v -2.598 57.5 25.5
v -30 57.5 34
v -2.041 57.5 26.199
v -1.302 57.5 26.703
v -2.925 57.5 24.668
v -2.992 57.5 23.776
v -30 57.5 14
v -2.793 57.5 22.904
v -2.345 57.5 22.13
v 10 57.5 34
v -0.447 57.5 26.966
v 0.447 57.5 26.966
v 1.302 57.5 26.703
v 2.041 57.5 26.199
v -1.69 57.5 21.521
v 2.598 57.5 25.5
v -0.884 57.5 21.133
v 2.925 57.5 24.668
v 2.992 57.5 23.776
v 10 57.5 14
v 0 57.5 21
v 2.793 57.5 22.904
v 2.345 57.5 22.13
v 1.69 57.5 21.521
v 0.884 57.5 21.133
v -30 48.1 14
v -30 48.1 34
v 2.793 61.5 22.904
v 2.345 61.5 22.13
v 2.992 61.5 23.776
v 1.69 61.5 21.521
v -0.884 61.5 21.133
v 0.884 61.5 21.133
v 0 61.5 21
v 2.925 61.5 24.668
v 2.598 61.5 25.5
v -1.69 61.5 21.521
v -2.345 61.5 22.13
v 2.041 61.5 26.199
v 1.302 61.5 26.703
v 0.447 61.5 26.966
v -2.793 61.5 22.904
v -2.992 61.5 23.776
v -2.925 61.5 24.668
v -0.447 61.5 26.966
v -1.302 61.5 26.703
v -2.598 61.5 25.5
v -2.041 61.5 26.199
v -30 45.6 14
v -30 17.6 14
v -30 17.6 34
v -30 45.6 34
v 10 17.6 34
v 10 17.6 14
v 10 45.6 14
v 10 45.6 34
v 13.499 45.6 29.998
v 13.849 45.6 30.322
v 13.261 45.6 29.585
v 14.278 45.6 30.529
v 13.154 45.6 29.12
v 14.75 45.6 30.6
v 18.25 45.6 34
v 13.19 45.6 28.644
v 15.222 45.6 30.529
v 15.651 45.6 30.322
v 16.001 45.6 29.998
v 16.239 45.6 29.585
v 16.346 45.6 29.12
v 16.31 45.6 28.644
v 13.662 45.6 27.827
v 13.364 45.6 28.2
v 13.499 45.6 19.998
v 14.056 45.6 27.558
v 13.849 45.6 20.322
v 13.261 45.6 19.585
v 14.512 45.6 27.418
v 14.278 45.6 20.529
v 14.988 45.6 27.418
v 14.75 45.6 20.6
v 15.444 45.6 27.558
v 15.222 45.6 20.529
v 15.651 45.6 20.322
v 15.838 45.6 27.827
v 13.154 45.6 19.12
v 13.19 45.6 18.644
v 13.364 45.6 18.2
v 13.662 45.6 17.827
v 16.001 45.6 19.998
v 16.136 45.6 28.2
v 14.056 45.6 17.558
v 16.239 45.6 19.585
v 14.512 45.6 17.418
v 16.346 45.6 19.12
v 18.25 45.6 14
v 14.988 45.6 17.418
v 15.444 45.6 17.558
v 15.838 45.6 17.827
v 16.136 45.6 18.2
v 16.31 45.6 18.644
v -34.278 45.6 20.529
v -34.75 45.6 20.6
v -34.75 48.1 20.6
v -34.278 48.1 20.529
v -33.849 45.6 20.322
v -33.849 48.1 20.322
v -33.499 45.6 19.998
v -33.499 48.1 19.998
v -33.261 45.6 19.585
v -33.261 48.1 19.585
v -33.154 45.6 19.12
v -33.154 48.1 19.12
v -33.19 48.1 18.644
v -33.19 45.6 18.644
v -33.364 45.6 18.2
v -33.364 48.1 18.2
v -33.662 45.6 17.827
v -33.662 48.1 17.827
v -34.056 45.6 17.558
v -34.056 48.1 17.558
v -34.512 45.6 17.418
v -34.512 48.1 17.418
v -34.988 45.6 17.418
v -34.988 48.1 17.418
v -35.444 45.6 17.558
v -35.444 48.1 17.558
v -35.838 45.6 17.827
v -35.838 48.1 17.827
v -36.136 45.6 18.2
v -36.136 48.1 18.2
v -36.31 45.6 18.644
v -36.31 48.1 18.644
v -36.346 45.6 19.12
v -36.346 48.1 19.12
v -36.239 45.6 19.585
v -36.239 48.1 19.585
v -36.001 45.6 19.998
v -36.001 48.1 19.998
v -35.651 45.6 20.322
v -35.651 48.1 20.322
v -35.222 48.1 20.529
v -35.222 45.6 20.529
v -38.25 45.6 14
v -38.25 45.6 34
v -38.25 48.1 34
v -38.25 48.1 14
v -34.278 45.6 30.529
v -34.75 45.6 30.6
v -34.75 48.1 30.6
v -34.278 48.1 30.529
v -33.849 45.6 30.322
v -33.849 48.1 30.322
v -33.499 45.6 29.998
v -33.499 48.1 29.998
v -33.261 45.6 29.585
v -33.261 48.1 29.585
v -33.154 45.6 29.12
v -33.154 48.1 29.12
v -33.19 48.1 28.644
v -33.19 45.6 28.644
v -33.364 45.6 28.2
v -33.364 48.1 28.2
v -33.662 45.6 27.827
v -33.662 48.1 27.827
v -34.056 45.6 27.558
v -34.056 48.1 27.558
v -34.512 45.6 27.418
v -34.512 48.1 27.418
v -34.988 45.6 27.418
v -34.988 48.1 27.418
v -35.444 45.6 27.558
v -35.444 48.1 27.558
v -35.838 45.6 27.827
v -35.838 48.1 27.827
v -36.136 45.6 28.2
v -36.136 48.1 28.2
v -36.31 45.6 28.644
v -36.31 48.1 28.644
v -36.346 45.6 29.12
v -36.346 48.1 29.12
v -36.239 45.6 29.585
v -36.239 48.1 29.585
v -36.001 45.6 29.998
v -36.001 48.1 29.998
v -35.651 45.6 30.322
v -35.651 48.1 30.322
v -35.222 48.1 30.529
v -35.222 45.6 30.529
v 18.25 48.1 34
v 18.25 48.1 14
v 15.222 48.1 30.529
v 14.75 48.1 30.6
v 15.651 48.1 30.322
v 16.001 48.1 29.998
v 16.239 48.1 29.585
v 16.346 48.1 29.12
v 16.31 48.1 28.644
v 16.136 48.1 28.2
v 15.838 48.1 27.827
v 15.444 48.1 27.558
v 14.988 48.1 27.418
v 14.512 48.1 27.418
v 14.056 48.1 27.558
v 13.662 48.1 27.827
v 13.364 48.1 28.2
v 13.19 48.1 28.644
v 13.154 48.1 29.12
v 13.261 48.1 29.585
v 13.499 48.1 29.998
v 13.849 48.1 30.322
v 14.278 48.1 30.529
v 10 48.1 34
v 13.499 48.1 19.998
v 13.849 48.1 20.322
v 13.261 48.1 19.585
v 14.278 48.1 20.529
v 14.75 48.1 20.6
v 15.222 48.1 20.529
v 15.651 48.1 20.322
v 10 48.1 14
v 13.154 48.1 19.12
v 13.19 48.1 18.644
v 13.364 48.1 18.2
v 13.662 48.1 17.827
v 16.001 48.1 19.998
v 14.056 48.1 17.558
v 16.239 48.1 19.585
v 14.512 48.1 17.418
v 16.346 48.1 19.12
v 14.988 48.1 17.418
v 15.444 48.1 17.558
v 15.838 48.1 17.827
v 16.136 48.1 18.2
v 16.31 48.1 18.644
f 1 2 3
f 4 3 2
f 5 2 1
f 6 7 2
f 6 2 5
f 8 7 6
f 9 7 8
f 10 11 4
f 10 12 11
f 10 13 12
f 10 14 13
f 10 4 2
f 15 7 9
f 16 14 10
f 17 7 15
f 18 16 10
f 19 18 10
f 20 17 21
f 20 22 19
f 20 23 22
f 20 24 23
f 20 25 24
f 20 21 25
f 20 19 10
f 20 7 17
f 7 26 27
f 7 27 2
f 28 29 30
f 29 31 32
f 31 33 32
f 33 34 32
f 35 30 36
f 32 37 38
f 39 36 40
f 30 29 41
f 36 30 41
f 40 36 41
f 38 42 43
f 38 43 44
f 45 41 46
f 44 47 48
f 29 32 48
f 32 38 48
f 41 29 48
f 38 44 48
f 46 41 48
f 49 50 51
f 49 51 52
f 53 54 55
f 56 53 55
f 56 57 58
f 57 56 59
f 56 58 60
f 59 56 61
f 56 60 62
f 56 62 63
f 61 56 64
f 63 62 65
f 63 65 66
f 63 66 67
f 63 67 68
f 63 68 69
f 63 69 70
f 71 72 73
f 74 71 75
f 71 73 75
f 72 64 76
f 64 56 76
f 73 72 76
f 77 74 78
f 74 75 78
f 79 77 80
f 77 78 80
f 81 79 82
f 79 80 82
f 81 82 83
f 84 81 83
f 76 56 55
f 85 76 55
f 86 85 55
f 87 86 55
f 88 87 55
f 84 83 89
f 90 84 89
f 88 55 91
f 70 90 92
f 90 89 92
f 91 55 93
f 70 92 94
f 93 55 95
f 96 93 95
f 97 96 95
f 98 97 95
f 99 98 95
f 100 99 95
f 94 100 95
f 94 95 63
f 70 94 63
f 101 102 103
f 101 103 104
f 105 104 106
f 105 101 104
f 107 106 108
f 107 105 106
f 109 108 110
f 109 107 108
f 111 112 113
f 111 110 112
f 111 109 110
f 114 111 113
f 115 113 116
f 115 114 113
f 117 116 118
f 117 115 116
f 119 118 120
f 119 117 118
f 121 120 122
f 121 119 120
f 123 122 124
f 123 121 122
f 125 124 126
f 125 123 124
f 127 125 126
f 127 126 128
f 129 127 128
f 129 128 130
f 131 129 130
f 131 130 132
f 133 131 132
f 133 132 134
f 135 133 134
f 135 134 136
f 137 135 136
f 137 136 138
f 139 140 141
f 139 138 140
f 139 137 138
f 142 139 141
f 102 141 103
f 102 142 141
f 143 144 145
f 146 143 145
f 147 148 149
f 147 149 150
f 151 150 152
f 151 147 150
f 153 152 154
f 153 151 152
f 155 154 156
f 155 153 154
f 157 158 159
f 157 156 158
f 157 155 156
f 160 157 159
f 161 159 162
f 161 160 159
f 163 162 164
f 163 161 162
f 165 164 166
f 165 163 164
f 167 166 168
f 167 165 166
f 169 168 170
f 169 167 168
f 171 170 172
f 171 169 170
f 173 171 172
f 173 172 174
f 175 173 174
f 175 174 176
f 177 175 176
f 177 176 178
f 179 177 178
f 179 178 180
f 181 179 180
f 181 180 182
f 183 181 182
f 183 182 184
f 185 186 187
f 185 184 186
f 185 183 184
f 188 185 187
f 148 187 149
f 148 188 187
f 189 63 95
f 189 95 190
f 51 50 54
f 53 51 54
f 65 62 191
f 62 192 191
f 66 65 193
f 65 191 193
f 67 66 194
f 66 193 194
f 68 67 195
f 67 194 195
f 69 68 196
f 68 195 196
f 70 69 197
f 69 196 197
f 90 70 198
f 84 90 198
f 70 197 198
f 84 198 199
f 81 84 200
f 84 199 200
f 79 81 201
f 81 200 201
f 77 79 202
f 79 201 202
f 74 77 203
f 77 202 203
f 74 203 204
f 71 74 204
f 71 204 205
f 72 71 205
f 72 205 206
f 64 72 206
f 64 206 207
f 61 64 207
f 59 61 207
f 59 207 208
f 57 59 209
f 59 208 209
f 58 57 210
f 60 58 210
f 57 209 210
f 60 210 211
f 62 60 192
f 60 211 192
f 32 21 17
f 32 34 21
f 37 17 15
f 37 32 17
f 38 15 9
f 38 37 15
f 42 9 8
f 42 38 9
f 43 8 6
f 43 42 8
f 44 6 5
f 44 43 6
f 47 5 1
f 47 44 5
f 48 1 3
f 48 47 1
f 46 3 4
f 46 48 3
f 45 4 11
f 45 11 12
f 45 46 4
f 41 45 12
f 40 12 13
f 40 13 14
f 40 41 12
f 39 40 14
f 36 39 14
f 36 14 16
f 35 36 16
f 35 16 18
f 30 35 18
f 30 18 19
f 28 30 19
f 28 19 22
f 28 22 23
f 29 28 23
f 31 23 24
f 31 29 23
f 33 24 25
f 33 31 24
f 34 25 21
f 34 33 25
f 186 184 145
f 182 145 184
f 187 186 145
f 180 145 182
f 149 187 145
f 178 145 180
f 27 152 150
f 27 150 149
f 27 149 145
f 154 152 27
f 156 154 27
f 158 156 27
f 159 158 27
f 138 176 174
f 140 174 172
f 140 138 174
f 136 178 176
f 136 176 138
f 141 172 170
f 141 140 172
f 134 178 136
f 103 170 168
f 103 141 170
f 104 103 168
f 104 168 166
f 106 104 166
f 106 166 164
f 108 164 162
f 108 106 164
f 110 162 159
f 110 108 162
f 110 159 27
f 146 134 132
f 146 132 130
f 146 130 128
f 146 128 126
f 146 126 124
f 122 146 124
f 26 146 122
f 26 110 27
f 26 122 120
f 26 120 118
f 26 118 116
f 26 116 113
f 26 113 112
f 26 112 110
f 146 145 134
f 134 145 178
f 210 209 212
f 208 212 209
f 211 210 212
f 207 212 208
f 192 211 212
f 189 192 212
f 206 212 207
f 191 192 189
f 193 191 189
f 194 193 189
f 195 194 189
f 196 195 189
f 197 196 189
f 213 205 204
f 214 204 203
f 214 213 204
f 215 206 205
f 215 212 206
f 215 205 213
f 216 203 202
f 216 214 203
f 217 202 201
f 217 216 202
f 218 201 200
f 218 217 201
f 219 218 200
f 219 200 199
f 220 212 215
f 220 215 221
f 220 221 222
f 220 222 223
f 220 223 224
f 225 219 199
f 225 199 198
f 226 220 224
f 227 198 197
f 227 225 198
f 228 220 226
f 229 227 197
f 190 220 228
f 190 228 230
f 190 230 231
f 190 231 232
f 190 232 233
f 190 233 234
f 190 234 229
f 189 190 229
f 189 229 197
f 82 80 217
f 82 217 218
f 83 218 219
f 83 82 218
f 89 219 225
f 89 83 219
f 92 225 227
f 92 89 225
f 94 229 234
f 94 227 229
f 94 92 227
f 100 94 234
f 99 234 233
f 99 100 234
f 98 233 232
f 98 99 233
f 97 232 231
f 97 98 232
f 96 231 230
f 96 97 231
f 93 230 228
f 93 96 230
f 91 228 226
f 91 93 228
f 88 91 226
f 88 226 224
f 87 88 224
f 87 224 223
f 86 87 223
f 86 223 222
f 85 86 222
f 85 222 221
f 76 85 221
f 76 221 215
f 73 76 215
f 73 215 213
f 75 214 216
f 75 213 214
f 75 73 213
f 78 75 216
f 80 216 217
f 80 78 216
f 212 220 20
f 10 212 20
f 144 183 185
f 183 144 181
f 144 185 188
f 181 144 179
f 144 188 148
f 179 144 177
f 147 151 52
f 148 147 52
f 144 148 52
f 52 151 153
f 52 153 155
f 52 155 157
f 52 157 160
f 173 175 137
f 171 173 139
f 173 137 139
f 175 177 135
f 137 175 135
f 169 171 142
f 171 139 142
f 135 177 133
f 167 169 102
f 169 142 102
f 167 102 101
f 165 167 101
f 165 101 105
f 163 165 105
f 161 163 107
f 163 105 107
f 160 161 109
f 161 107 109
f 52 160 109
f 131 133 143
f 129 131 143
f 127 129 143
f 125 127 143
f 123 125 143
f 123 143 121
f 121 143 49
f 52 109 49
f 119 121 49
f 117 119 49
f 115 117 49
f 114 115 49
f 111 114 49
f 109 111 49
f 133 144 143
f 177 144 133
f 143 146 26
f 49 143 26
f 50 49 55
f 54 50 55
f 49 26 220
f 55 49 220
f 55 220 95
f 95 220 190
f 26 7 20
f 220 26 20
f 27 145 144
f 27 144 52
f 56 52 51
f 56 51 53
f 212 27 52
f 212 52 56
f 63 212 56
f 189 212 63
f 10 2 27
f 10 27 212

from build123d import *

# Parameters (mm, degrees)
CASE_SKETCH_W      = 40
CASE_SKETCH_H      = 39.9
CASE_2_DEPTH       = 20
TABS_SKETCH_W      = 8.25
TABS_SKETCH_H      = 2.5
TABS_DEPTH         = 20
SHAFT_SKETCH_W     = 3
SHAFT_SKETCH_H     = 4
TAB_HOLES_SKETCH_R = 1.6
TAB_HOLES_DEPTH    = 53.1


with BuildPart() as part:
    # Case Sketch → Case 2 (new body)
    with BuildSketch(Plane.XY.offset(14)):
        with Locations((-10, 37.55)):
            Rectangle(CASE_SKETCH_W, CASE_SKETCH_H)
    extrude(amount=CASE_2_DEPTH)

    # Tabs Sketch → Tabs (add)
    with BuildSketch(Plane.XY.offset(14)):
        with Locations((-34.125, 46.85)):
            Rectangle(TABS_SKETCH_W, TABS_SKETCH_H)
        with Locations((14.125, 46.85)):
            Rectangle(TABS_SKETCH_W, TABS_SKETCH_H)
    extrude(amount=TABS_DEPTH)

    # Shaft Sketch → Shaft (revolve)
    with BuildSketch(Plane.XY.offset(24)):
        with Locations((1.5, 59.5)):
            Rectangle(SHAFT_SKETCH_W, SHAFT_SKETCH_H)
    revolve(axis=Axis((0, -100, 24), (0, 1, 0)))

    # Tab Holes Sketch → Tab Holes (cut, symmetric)
    with BuildSketch(Plane(origin=(0, 0, 0), x_dir=(1, 0, 0), z_dir=(0, 1, 0))):
        with Locations((-34.75, -19)):
            Circle(TAB_HOLES_SKETCH_R)
        with Locations((-34.75, -29)):
            Circle(TAB_HOLES_SKETCH_R)
        with Locations((14.75, -19)):
            Circle(TAB_HOLES_SKETCH_R)
        with Locations((14.75, -29)):
            Circle(TAB_HOLES_SKETCH_R)
    extrude(amount=TAB_HOLES_DEPTH, both=True, mode=Mode.SUBTRACT)


solid = part.part
